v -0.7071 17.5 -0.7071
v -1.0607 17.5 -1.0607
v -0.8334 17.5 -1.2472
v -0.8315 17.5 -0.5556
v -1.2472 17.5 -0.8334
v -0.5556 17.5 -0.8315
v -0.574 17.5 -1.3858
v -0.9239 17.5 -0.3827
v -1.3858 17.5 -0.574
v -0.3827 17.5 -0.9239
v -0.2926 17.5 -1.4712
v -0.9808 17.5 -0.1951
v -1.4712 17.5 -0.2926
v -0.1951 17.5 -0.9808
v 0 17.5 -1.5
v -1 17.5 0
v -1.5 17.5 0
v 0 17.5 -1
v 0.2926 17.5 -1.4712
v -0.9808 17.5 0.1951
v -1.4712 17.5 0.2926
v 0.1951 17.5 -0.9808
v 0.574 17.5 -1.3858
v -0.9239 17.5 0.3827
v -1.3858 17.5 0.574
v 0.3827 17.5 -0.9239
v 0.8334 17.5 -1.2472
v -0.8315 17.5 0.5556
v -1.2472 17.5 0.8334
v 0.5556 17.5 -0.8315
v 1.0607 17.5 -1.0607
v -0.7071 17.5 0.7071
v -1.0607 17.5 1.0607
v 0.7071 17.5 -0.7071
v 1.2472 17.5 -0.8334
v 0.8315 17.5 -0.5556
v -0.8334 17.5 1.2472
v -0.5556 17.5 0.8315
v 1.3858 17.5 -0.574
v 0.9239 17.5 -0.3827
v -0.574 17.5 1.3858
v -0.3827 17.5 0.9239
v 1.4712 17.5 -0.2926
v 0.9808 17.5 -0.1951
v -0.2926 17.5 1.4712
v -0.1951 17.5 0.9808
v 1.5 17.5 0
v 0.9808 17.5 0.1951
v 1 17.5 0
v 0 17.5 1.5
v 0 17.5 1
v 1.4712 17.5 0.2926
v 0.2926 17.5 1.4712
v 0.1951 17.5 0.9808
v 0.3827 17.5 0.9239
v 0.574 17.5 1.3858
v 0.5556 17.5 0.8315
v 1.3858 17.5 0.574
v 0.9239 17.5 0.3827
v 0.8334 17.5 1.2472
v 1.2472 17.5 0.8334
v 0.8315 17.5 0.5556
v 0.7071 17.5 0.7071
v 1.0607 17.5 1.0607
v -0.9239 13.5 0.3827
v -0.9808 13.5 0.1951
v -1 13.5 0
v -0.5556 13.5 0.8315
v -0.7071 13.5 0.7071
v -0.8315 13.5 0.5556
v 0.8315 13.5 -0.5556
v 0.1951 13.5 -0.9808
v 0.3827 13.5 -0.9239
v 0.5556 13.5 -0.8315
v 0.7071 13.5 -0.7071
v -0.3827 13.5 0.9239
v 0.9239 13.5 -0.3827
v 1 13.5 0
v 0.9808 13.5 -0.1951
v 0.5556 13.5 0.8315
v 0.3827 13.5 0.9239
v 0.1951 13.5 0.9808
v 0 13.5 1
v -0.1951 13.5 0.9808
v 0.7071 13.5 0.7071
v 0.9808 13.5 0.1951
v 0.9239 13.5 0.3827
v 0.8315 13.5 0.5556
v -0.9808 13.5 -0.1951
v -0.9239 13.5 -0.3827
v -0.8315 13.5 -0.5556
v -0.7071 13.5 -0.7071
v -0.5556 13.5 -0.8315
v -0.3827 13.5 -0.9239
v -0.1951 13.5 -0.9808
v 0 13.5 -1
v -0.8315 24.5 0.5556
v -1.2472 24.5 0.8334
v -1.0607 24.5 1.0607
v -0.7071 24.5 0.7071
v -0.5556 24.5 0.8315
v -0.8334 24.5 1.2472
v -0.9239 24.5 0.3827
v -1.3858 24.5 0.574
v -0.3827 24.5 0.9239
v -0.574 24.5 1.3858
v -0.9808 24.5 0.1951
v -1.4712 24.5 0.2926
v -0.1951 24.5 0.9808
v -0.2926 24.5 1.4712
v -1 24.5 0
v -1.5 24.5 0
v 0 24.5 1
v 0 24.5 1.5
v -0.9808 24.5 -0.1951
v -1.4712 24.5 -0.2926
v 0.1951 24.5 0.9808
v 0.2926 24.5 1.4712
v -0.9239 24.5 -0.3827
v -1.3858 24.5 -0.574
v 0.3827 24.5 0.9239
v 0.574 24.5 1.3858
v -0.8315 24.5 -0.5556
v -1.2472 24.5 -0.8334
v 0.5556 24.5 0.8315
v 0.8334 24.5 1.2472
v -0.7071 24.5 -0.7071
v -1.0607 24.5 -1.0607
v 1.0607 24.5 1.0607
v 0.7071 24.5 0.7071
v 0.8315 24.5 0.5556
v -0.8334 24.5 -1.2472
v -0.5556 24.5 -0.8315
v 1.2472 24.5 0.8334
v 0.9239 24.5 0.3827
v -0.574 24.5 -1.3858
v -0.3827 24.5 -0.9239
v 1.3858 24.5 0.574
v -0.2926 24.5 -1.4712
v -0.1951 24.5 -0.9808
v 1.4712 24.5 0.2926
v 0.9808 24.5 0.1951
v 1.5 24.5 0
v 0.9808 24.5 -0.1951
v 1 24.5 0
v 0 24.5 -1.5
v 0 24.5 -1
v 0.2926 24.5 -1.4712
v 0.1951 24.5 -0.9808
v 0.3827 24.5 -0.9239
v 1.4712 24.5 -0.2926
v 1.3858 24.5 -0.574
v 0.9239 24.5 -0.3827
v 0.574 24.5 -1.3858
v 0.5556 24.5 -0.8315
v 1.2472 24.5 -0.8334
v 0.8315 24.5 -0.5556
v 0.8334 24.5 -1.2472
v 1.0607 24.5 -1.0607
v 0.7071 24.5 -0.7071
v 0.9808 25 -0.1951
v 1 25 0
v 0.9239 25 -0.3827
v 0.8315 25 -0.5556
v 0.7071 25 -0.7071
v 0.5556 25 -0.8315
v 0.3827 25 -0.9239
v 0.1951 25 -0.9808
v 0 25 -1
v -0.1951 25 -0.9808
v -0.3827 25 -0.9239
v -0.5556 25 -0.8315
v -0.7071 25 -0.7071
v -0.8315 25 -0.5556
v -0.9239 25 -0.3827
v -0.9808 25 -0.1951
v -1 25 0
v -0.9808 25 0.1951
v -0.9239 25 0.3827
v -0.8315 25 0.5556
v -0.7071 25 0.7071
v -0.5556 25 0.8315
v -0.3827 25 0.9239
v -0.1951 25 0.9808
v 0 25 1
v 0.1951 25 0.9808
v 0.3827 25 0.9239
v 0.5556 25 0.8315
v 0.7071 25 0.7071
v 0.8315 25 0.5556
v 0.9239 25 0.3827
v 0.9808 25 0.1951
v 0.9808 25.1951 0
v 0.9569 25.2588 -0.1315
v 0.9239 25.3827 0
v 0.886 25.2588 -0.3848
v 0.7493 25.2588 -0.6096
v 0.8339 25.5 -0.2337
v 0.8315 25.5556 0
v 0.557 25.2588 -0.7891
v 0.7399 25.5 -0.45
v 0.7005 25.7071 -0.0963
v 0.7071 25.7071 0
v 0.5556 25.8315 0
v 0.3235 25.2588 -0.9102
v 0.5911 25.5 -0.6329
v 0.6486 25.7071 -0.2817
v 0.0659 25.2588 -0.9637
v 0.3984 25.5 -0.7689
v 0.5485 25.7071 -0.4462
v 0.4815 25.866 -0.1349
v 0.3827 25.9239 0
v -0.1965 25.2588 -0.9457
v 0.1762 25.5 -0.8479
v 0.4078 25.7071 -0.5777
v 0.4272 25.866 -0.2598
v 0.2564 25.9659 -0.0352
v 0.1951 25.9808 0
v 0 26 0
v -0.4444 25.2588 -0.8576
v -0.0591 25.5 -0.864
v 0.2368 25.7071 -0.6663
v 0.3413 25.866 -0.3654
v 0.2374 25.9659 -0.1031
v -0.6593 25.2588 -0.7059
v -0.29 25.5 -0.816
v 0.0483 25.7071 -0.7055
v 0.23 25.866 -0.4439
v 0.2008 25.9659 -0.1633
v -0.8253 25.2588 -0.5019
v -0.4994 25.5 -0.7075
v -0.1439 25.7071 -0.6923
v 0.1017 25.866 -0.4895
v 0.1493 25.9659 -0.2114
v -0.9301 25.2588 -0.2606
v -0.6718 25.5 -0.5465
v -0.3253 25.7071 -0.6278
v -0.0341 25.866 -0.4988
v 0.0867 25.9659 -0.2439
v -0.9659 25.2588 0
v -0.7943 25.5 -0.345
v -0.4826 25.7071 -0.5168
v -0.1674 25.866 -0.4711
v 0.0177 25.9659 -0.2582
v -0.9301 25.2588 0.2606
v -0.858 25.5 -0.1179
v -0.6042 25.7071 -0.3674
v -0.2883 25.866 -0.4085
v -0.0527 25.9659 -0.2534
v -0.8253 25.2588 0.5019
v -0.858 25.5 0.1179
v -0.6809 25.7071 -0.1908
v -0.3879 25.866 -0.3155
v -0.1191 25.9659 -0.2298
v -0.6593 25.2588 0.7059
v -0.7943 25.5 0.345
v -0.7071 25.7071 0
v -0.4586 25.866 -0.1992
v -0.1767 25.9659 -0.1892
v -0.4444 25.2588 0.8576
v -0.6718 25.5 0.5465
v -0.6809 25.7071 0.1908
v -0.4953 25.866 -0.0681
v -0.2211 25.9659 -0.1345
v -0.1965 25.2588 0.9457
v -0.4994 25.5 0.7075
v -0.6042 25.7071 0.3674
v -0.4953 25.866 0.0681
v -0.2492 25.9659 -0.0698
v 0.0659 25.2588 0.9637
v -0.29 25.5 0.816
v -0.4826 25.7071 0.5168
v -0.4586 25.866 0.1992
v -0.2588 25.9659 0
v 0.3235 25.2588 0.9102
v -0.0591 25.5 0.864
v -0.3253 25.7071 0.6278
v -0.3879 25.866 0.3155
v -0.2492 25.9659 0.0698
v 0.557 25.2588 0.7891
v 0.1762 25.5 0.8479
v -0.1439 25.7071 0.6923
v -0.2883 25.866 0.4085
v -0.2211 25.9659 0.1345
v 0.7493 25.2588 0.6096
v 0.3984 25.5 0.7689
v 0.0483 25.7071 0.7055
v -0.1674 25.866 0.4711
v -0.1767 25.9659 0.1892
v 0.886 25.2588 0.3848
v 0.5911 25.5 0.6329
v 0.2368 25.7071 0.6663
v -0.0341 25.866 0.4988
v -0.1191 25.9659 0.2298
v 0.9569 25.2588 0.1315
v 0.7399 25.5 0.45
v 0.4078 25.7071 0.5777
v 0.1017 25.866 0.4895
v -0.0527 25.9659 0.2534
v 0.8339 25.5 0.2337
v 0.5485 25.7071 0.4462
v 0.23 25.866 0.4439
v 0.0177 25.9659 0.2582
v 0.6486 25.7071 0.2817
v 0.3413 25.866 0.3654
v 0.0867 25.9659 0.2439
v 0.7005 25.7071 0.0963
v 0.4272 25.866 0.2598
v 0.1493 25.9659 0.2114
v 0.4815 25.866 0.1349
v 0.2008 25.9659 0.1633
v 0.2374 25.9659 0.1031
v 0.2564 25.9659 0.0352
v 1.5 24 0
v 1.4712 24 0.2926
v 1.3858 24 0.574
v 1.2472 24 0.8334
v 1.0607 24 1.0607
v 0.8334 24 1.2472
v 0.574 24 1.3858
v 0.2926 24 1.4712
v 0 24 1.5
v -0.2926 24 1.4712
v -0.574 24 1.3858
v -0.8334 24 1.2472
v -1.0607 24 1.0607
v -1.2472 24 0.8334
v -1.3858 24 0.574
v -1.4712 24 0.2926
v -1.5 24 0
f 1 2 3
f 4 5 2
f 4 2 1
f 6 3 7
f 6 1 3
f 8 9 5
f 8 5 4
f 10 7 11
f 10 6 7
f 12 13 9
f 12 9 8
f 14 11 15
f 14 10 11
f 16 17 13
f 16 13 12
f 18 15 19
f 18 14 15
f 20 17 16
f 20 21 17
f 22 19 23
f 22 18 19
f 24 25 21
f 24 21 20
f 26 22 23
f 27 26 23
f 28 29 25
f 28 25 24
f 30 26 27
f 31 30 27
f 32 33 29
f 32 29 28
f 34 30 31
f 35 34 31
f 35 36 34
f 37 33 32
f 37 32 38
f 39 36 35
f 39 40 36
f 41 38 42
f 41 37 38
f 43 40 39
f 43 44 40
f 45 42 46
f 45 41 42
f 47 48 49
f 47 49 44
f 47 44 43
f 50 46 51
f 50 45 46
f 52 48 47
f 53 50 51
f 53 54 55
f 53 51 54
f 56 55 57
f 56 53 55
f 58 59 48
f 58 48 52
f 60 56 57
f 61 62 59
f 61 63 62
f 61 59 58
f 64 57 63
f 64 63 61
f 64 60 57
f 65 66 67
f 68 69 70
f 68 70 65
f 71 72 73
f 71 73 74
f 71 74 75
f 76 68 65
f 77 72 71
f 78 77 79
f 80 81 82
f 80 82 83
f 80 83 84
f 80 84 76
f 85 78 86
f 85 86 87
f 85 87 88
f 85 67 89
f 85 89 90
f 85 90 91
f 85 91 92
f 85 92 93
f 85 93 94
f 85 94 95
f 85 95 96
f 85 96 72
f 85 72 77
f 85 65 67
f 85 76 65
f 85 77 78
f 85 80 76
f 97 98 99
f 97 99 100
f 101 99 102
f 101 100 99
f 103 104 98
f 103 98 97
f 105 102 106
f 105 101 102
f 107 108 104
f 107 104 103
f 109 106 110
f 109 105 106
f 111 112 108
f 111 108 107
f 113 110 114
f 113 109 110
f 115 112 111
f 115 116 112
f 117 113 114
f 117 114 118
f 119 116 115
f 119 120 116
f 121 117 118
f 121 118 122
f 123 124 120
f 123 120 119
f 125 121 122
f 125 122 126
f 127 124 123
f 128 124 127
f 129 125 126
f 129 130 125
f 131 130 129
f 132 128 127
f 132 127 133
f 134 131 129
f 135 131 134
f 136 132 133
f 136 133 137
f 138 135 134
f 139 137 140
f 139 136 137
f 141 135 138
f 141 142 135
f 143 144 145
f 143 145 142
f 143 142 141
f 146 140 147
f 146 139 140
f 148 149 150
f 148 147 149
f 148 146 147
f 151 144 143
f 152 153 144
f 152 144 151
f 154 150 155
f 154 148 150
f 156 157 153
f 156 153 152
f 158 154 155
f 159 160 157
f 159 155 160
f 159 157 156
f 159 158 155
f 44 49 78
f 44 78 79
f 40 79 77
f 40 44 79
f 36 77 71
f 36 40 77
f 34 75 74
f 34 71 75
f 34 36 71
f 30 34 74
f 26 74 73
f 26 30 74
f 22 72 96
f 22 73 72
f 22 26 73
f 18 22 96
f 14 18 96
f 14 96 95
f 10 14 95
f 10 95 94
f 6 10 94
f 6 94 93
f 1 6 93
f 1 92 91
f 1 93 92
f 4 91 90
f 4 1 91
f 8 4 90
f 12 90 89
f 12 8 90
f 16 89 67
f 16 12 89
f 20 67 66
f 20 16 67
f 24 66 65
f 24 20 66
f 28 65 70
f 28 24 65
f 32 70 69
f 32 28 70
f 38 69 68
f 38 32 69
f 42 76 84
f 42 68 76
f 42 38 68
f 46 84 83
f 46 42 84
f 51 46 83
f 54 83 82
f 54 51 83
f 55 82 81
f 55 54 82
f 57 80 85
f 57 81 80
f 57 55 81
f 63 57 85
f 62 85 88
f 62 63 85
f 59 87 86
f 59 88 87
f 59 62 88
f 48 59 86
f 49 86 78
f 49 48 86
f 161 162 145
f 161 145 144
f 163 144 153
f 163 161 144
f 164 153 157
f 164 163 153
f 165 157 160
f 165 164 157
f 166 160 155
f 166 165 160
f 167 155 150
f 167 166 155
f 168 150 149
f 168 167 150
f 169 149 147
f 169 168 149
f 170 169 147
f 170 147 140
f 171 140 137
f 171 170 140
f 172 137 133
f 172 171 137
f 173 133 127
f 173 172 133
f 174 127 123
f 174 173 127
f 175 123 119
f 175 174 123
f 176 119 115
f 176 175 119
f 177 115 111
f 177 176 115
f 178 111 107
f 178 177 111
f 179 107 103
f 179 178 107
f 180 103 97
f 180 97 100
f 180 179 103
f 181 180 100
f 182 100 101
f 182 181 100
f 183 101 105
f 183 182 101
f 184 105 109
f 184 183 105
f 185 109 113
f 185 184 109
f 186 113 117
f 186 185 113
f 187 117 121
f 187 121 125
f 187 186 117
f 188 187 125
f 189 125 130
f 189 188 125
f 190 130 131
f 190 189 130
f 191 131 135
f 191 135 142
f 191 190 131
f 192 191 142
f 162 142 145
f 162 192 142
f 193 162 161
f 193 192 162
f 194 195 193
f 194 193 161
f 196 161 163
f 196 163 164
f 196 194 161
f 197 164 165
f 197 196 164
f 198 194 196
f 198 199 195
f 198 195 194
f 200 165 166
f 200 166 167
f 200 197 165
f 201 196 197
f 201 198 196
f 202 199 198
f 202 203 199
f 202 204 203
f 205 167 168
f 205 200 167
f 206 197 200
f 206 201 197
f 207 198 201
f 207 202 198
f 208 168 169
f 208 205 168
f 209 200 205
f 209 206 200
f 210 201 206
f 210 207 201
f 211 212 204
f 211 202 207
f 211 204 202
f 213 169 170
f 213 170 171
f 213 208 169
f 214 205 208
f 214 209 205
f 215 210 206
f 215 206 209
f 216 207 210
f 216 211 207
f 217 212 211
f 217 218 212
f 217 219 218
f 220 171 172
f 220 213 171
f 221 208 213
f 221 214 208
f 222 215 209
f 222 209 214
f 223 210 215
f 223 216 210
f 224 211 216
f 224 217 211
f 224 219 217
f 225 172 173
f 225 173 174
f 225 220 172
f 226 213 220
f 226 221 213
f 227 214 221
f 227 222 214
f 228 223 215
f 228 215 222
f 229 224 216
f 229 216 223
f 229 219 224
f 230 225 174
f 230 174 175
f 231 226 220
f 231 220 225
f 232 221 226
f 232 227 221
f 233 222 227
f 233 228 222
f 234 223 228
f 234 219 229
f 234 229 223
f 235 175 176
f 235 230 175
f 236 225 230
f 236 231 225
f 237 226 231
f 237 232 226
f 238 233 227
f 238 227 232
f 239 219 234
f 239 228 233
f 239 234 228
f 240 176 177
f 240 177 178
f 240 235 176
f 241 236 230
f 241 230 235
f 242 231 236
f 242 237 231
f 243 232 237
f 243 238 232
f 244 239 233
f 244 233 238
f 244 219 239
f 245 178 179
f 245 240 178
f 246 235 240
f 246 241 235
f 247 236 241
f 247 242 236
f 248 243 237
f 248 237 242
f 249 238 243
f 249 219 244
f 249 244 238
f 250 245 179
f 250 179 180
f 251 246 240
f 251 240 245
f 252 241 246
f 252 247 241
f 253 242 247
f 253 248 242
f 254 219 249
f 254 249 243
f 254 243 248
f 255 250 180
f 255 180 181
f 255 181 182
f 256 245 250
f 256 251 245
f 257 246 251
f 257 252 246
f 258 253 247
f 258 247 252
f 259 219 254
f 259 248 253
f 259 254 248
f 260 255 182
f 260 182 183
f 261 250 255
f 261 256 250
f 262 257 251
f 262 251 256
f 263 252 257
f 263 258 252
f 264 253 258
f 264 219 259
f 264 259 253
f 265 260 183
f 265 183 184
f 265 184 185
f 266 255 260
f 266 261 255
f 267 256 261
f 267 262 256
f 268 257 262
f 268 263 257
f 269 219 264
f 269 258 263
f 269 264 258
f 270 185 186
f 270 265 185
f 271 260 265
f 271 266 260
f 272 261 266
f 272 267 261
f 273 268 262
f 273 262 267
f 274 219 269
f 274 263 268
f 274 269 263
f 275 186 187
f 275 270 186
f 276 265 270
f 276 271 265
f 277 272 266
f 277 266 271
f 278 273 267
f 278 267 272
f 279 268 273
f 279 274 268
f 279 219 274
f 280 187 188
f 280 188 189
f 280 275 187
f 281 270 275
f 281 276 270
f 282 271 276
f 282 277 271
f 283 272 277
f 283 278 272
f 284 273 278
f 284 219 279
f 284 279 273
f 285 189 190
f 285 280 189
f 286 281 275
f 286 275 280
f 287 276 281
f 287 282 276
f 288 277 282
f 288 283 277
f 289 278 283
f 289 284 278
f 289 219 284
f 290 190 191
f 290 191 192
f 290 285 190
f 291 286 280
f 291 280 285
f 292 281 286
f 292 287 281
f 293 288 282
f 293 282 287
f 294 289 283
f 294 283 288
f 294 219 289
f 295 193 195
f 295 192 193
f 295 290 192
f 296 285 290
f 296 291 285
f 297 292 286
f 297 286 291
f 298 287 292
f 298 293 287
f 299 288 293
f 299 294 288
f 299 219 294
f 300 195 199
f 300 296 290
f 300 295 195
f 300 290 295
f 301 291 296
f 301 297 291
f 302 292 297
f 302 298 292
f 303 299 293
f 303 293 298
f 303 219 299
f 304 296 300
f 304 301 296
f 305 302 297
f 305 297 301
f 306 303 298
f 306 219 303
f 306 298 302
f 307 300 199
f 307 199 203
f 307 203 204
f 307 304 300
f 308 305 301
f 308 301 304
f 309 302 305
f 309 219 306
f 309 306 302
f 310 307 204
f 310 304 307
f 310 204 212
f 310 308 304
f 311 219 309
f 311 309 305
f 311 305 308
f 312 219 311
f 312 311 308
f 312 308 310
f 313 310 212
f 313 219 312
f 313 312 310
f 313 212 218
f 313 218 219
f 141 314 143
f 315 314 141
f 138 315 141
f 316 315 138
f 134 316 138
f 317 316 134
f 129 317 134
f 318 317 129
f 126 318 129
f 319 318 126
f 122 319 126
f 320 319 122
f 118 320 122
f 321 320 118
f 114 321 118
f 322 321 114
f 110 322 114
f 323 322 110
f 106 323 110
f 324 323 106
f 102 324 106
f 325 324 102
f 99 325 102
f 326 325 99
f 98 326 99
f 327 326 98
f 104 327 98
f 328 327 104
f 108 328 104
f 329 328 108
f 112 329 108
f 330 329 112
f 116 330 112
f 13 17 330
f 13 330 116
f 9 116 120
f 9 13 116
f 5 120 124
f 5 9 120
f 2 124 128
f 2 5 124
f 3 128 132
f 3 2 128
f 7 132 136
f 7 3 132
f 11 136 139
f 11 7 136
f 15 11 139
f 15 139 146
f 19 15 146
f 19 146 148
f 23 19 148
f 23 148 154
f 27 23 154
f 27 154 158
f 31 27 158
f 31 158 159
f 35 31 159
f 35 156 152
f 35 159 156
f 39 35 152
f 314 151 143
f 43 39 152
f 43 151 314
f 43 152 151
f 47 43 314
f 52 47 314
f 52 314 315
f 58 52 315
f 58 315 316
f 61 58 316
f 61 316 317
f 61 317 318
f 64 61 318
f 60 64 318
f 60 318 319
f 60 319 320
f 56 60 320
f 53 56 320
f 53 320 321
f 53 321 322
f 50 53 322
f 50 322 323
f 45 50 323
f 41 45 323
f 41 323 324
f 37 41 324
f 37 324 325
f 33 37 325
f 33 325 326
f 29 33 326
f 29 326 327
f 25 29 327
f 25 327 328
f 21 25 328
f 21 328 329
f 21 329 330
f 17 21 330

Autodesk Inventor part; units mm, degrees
ref_plane "YZ Plane" through (0, 0, 0) normal (1, 0, 0) x (0, 1, 0)
ref_plane "XZ Plane" through (0, 0, 0) normal (0, 1, 0) x (-1, 0, 0)
ref_plane "XY Plane" through (0, 0, 0) normal (0, 0, 1) x (1, 0, 0)
sketch "Sketch1" plane through (0, 0, 0) normal (0, 1, 0) x (-1, 0, 0)
  circle A0 centre (0, 0) radius 1.5
  dimension "d0" = 3
extrude "Extrusion1" add sketch "Sketch1" along normal blind 25
sketch "Sketch2" plane through (0, 25, 0) normal (0, 1, 0) x (1, 0, 0)
  circle A0 centre (0, 0) radius 1.5
extrude "Extrusion2" add sketch "Sketch2" along normal blind 2
sketch "Sketch3" plane through (0, 27, 0) normal (0, 1, 0) x (1, 0, 0)
  circle A0 centre (0, 0) radius 1.5
extrude "Extrusion3" cut sketch "Sketch3" against normal blind 1
sketch "Sketch4" plane through (0, 0, 0) normal (0, -1, 0) x (1, 0, 0)
  circle A0 centre (0, 0) radius 1.5
extrude "Extrusion4" cut sketch "Sketch4" against normal blind 1
sketch "Sketch5" plane through (0, 1, 0) normal (0, -1, 0) x (1, 0, 0)
  circle A0 centre (0, 0) radius 1
  circle A1 centre (0, 0) radius 1.5 projected
  circle A2 centre (0, 0) radius 1.5
  dimension "d9" = 2
extrude "Extrusion5" cut sketch "Sketch5" against normal blind 1.5
fillet "Fillet1" radius 1 1 edges at (-1, 1, 0)
sketch "Sketch6" plane through (0, 26, 0) normal (0, 1, 0) x (1, 0, 0)
  circle A0 centre (0, 0) radius 1.5
  circle A1 centre (0, 0) radius 1 projected
extrude "Extrusion6" cut sketch "Sketch6" against normal blind 2
fillet "Fillet2" radius 1 1 edges at (-1, 26, 0)
sketch "Sketch7" plane through (0, 24, 0) normal (0, 1, 0) x (1, 0, 0)
  circle A0 centre (0, 0) radius 1.5
  dimension "d16" = 3
extrude "Extrusion7" add sketch "Sketch7" along normal blind 0.5
sketch "Sketch8" plane through (0, 2.5, 0) normal (0, -1, 0) x (1, 0, 0)
  circle A0 centre (0, 0) radius 1.5
extrude "Extrusion8" cut sketch "Sketch8" along normal blind 5.5 and the other way blind 11
sketch "Sketch9" plane through (0, 13.5, 0) normal (0, -1, 0) x (1, 0, 0)
  circle A0 centre (0, 0) radius 1 projected
  circle A1 centre (0, 0) radius 1.5
extrude "Extrusion9" cut sketch "Sketch9" against normal blind 4
sketch "Sketch10" plane through (0, 13.5, 0) normal (0, -1, 0) x (1, 0, 0)
  circle A0 centre (0, 0) radius 1
extrude "Extrusion10" add sketch "Sketch10" along normal blind 1
sketch "Sketch11" plane through (0, 12.5, 0) normal (0, -1, 0) x (1, 0, 0)
  circle A0 centre (0, 0) radius 1
extrude "Extrusion11" cut sketch "Sketch11" against normal blind 2
sketch "Sketch12" plane through (0, 14.5, 0) normal (0, -1, 0) x (1, 0, 0)
  circle A0 centre (0, 0) radius 1
extrude "Extrusion12" add sketch "Sketch12" along normal blind 1
properties part number "Pin2"
